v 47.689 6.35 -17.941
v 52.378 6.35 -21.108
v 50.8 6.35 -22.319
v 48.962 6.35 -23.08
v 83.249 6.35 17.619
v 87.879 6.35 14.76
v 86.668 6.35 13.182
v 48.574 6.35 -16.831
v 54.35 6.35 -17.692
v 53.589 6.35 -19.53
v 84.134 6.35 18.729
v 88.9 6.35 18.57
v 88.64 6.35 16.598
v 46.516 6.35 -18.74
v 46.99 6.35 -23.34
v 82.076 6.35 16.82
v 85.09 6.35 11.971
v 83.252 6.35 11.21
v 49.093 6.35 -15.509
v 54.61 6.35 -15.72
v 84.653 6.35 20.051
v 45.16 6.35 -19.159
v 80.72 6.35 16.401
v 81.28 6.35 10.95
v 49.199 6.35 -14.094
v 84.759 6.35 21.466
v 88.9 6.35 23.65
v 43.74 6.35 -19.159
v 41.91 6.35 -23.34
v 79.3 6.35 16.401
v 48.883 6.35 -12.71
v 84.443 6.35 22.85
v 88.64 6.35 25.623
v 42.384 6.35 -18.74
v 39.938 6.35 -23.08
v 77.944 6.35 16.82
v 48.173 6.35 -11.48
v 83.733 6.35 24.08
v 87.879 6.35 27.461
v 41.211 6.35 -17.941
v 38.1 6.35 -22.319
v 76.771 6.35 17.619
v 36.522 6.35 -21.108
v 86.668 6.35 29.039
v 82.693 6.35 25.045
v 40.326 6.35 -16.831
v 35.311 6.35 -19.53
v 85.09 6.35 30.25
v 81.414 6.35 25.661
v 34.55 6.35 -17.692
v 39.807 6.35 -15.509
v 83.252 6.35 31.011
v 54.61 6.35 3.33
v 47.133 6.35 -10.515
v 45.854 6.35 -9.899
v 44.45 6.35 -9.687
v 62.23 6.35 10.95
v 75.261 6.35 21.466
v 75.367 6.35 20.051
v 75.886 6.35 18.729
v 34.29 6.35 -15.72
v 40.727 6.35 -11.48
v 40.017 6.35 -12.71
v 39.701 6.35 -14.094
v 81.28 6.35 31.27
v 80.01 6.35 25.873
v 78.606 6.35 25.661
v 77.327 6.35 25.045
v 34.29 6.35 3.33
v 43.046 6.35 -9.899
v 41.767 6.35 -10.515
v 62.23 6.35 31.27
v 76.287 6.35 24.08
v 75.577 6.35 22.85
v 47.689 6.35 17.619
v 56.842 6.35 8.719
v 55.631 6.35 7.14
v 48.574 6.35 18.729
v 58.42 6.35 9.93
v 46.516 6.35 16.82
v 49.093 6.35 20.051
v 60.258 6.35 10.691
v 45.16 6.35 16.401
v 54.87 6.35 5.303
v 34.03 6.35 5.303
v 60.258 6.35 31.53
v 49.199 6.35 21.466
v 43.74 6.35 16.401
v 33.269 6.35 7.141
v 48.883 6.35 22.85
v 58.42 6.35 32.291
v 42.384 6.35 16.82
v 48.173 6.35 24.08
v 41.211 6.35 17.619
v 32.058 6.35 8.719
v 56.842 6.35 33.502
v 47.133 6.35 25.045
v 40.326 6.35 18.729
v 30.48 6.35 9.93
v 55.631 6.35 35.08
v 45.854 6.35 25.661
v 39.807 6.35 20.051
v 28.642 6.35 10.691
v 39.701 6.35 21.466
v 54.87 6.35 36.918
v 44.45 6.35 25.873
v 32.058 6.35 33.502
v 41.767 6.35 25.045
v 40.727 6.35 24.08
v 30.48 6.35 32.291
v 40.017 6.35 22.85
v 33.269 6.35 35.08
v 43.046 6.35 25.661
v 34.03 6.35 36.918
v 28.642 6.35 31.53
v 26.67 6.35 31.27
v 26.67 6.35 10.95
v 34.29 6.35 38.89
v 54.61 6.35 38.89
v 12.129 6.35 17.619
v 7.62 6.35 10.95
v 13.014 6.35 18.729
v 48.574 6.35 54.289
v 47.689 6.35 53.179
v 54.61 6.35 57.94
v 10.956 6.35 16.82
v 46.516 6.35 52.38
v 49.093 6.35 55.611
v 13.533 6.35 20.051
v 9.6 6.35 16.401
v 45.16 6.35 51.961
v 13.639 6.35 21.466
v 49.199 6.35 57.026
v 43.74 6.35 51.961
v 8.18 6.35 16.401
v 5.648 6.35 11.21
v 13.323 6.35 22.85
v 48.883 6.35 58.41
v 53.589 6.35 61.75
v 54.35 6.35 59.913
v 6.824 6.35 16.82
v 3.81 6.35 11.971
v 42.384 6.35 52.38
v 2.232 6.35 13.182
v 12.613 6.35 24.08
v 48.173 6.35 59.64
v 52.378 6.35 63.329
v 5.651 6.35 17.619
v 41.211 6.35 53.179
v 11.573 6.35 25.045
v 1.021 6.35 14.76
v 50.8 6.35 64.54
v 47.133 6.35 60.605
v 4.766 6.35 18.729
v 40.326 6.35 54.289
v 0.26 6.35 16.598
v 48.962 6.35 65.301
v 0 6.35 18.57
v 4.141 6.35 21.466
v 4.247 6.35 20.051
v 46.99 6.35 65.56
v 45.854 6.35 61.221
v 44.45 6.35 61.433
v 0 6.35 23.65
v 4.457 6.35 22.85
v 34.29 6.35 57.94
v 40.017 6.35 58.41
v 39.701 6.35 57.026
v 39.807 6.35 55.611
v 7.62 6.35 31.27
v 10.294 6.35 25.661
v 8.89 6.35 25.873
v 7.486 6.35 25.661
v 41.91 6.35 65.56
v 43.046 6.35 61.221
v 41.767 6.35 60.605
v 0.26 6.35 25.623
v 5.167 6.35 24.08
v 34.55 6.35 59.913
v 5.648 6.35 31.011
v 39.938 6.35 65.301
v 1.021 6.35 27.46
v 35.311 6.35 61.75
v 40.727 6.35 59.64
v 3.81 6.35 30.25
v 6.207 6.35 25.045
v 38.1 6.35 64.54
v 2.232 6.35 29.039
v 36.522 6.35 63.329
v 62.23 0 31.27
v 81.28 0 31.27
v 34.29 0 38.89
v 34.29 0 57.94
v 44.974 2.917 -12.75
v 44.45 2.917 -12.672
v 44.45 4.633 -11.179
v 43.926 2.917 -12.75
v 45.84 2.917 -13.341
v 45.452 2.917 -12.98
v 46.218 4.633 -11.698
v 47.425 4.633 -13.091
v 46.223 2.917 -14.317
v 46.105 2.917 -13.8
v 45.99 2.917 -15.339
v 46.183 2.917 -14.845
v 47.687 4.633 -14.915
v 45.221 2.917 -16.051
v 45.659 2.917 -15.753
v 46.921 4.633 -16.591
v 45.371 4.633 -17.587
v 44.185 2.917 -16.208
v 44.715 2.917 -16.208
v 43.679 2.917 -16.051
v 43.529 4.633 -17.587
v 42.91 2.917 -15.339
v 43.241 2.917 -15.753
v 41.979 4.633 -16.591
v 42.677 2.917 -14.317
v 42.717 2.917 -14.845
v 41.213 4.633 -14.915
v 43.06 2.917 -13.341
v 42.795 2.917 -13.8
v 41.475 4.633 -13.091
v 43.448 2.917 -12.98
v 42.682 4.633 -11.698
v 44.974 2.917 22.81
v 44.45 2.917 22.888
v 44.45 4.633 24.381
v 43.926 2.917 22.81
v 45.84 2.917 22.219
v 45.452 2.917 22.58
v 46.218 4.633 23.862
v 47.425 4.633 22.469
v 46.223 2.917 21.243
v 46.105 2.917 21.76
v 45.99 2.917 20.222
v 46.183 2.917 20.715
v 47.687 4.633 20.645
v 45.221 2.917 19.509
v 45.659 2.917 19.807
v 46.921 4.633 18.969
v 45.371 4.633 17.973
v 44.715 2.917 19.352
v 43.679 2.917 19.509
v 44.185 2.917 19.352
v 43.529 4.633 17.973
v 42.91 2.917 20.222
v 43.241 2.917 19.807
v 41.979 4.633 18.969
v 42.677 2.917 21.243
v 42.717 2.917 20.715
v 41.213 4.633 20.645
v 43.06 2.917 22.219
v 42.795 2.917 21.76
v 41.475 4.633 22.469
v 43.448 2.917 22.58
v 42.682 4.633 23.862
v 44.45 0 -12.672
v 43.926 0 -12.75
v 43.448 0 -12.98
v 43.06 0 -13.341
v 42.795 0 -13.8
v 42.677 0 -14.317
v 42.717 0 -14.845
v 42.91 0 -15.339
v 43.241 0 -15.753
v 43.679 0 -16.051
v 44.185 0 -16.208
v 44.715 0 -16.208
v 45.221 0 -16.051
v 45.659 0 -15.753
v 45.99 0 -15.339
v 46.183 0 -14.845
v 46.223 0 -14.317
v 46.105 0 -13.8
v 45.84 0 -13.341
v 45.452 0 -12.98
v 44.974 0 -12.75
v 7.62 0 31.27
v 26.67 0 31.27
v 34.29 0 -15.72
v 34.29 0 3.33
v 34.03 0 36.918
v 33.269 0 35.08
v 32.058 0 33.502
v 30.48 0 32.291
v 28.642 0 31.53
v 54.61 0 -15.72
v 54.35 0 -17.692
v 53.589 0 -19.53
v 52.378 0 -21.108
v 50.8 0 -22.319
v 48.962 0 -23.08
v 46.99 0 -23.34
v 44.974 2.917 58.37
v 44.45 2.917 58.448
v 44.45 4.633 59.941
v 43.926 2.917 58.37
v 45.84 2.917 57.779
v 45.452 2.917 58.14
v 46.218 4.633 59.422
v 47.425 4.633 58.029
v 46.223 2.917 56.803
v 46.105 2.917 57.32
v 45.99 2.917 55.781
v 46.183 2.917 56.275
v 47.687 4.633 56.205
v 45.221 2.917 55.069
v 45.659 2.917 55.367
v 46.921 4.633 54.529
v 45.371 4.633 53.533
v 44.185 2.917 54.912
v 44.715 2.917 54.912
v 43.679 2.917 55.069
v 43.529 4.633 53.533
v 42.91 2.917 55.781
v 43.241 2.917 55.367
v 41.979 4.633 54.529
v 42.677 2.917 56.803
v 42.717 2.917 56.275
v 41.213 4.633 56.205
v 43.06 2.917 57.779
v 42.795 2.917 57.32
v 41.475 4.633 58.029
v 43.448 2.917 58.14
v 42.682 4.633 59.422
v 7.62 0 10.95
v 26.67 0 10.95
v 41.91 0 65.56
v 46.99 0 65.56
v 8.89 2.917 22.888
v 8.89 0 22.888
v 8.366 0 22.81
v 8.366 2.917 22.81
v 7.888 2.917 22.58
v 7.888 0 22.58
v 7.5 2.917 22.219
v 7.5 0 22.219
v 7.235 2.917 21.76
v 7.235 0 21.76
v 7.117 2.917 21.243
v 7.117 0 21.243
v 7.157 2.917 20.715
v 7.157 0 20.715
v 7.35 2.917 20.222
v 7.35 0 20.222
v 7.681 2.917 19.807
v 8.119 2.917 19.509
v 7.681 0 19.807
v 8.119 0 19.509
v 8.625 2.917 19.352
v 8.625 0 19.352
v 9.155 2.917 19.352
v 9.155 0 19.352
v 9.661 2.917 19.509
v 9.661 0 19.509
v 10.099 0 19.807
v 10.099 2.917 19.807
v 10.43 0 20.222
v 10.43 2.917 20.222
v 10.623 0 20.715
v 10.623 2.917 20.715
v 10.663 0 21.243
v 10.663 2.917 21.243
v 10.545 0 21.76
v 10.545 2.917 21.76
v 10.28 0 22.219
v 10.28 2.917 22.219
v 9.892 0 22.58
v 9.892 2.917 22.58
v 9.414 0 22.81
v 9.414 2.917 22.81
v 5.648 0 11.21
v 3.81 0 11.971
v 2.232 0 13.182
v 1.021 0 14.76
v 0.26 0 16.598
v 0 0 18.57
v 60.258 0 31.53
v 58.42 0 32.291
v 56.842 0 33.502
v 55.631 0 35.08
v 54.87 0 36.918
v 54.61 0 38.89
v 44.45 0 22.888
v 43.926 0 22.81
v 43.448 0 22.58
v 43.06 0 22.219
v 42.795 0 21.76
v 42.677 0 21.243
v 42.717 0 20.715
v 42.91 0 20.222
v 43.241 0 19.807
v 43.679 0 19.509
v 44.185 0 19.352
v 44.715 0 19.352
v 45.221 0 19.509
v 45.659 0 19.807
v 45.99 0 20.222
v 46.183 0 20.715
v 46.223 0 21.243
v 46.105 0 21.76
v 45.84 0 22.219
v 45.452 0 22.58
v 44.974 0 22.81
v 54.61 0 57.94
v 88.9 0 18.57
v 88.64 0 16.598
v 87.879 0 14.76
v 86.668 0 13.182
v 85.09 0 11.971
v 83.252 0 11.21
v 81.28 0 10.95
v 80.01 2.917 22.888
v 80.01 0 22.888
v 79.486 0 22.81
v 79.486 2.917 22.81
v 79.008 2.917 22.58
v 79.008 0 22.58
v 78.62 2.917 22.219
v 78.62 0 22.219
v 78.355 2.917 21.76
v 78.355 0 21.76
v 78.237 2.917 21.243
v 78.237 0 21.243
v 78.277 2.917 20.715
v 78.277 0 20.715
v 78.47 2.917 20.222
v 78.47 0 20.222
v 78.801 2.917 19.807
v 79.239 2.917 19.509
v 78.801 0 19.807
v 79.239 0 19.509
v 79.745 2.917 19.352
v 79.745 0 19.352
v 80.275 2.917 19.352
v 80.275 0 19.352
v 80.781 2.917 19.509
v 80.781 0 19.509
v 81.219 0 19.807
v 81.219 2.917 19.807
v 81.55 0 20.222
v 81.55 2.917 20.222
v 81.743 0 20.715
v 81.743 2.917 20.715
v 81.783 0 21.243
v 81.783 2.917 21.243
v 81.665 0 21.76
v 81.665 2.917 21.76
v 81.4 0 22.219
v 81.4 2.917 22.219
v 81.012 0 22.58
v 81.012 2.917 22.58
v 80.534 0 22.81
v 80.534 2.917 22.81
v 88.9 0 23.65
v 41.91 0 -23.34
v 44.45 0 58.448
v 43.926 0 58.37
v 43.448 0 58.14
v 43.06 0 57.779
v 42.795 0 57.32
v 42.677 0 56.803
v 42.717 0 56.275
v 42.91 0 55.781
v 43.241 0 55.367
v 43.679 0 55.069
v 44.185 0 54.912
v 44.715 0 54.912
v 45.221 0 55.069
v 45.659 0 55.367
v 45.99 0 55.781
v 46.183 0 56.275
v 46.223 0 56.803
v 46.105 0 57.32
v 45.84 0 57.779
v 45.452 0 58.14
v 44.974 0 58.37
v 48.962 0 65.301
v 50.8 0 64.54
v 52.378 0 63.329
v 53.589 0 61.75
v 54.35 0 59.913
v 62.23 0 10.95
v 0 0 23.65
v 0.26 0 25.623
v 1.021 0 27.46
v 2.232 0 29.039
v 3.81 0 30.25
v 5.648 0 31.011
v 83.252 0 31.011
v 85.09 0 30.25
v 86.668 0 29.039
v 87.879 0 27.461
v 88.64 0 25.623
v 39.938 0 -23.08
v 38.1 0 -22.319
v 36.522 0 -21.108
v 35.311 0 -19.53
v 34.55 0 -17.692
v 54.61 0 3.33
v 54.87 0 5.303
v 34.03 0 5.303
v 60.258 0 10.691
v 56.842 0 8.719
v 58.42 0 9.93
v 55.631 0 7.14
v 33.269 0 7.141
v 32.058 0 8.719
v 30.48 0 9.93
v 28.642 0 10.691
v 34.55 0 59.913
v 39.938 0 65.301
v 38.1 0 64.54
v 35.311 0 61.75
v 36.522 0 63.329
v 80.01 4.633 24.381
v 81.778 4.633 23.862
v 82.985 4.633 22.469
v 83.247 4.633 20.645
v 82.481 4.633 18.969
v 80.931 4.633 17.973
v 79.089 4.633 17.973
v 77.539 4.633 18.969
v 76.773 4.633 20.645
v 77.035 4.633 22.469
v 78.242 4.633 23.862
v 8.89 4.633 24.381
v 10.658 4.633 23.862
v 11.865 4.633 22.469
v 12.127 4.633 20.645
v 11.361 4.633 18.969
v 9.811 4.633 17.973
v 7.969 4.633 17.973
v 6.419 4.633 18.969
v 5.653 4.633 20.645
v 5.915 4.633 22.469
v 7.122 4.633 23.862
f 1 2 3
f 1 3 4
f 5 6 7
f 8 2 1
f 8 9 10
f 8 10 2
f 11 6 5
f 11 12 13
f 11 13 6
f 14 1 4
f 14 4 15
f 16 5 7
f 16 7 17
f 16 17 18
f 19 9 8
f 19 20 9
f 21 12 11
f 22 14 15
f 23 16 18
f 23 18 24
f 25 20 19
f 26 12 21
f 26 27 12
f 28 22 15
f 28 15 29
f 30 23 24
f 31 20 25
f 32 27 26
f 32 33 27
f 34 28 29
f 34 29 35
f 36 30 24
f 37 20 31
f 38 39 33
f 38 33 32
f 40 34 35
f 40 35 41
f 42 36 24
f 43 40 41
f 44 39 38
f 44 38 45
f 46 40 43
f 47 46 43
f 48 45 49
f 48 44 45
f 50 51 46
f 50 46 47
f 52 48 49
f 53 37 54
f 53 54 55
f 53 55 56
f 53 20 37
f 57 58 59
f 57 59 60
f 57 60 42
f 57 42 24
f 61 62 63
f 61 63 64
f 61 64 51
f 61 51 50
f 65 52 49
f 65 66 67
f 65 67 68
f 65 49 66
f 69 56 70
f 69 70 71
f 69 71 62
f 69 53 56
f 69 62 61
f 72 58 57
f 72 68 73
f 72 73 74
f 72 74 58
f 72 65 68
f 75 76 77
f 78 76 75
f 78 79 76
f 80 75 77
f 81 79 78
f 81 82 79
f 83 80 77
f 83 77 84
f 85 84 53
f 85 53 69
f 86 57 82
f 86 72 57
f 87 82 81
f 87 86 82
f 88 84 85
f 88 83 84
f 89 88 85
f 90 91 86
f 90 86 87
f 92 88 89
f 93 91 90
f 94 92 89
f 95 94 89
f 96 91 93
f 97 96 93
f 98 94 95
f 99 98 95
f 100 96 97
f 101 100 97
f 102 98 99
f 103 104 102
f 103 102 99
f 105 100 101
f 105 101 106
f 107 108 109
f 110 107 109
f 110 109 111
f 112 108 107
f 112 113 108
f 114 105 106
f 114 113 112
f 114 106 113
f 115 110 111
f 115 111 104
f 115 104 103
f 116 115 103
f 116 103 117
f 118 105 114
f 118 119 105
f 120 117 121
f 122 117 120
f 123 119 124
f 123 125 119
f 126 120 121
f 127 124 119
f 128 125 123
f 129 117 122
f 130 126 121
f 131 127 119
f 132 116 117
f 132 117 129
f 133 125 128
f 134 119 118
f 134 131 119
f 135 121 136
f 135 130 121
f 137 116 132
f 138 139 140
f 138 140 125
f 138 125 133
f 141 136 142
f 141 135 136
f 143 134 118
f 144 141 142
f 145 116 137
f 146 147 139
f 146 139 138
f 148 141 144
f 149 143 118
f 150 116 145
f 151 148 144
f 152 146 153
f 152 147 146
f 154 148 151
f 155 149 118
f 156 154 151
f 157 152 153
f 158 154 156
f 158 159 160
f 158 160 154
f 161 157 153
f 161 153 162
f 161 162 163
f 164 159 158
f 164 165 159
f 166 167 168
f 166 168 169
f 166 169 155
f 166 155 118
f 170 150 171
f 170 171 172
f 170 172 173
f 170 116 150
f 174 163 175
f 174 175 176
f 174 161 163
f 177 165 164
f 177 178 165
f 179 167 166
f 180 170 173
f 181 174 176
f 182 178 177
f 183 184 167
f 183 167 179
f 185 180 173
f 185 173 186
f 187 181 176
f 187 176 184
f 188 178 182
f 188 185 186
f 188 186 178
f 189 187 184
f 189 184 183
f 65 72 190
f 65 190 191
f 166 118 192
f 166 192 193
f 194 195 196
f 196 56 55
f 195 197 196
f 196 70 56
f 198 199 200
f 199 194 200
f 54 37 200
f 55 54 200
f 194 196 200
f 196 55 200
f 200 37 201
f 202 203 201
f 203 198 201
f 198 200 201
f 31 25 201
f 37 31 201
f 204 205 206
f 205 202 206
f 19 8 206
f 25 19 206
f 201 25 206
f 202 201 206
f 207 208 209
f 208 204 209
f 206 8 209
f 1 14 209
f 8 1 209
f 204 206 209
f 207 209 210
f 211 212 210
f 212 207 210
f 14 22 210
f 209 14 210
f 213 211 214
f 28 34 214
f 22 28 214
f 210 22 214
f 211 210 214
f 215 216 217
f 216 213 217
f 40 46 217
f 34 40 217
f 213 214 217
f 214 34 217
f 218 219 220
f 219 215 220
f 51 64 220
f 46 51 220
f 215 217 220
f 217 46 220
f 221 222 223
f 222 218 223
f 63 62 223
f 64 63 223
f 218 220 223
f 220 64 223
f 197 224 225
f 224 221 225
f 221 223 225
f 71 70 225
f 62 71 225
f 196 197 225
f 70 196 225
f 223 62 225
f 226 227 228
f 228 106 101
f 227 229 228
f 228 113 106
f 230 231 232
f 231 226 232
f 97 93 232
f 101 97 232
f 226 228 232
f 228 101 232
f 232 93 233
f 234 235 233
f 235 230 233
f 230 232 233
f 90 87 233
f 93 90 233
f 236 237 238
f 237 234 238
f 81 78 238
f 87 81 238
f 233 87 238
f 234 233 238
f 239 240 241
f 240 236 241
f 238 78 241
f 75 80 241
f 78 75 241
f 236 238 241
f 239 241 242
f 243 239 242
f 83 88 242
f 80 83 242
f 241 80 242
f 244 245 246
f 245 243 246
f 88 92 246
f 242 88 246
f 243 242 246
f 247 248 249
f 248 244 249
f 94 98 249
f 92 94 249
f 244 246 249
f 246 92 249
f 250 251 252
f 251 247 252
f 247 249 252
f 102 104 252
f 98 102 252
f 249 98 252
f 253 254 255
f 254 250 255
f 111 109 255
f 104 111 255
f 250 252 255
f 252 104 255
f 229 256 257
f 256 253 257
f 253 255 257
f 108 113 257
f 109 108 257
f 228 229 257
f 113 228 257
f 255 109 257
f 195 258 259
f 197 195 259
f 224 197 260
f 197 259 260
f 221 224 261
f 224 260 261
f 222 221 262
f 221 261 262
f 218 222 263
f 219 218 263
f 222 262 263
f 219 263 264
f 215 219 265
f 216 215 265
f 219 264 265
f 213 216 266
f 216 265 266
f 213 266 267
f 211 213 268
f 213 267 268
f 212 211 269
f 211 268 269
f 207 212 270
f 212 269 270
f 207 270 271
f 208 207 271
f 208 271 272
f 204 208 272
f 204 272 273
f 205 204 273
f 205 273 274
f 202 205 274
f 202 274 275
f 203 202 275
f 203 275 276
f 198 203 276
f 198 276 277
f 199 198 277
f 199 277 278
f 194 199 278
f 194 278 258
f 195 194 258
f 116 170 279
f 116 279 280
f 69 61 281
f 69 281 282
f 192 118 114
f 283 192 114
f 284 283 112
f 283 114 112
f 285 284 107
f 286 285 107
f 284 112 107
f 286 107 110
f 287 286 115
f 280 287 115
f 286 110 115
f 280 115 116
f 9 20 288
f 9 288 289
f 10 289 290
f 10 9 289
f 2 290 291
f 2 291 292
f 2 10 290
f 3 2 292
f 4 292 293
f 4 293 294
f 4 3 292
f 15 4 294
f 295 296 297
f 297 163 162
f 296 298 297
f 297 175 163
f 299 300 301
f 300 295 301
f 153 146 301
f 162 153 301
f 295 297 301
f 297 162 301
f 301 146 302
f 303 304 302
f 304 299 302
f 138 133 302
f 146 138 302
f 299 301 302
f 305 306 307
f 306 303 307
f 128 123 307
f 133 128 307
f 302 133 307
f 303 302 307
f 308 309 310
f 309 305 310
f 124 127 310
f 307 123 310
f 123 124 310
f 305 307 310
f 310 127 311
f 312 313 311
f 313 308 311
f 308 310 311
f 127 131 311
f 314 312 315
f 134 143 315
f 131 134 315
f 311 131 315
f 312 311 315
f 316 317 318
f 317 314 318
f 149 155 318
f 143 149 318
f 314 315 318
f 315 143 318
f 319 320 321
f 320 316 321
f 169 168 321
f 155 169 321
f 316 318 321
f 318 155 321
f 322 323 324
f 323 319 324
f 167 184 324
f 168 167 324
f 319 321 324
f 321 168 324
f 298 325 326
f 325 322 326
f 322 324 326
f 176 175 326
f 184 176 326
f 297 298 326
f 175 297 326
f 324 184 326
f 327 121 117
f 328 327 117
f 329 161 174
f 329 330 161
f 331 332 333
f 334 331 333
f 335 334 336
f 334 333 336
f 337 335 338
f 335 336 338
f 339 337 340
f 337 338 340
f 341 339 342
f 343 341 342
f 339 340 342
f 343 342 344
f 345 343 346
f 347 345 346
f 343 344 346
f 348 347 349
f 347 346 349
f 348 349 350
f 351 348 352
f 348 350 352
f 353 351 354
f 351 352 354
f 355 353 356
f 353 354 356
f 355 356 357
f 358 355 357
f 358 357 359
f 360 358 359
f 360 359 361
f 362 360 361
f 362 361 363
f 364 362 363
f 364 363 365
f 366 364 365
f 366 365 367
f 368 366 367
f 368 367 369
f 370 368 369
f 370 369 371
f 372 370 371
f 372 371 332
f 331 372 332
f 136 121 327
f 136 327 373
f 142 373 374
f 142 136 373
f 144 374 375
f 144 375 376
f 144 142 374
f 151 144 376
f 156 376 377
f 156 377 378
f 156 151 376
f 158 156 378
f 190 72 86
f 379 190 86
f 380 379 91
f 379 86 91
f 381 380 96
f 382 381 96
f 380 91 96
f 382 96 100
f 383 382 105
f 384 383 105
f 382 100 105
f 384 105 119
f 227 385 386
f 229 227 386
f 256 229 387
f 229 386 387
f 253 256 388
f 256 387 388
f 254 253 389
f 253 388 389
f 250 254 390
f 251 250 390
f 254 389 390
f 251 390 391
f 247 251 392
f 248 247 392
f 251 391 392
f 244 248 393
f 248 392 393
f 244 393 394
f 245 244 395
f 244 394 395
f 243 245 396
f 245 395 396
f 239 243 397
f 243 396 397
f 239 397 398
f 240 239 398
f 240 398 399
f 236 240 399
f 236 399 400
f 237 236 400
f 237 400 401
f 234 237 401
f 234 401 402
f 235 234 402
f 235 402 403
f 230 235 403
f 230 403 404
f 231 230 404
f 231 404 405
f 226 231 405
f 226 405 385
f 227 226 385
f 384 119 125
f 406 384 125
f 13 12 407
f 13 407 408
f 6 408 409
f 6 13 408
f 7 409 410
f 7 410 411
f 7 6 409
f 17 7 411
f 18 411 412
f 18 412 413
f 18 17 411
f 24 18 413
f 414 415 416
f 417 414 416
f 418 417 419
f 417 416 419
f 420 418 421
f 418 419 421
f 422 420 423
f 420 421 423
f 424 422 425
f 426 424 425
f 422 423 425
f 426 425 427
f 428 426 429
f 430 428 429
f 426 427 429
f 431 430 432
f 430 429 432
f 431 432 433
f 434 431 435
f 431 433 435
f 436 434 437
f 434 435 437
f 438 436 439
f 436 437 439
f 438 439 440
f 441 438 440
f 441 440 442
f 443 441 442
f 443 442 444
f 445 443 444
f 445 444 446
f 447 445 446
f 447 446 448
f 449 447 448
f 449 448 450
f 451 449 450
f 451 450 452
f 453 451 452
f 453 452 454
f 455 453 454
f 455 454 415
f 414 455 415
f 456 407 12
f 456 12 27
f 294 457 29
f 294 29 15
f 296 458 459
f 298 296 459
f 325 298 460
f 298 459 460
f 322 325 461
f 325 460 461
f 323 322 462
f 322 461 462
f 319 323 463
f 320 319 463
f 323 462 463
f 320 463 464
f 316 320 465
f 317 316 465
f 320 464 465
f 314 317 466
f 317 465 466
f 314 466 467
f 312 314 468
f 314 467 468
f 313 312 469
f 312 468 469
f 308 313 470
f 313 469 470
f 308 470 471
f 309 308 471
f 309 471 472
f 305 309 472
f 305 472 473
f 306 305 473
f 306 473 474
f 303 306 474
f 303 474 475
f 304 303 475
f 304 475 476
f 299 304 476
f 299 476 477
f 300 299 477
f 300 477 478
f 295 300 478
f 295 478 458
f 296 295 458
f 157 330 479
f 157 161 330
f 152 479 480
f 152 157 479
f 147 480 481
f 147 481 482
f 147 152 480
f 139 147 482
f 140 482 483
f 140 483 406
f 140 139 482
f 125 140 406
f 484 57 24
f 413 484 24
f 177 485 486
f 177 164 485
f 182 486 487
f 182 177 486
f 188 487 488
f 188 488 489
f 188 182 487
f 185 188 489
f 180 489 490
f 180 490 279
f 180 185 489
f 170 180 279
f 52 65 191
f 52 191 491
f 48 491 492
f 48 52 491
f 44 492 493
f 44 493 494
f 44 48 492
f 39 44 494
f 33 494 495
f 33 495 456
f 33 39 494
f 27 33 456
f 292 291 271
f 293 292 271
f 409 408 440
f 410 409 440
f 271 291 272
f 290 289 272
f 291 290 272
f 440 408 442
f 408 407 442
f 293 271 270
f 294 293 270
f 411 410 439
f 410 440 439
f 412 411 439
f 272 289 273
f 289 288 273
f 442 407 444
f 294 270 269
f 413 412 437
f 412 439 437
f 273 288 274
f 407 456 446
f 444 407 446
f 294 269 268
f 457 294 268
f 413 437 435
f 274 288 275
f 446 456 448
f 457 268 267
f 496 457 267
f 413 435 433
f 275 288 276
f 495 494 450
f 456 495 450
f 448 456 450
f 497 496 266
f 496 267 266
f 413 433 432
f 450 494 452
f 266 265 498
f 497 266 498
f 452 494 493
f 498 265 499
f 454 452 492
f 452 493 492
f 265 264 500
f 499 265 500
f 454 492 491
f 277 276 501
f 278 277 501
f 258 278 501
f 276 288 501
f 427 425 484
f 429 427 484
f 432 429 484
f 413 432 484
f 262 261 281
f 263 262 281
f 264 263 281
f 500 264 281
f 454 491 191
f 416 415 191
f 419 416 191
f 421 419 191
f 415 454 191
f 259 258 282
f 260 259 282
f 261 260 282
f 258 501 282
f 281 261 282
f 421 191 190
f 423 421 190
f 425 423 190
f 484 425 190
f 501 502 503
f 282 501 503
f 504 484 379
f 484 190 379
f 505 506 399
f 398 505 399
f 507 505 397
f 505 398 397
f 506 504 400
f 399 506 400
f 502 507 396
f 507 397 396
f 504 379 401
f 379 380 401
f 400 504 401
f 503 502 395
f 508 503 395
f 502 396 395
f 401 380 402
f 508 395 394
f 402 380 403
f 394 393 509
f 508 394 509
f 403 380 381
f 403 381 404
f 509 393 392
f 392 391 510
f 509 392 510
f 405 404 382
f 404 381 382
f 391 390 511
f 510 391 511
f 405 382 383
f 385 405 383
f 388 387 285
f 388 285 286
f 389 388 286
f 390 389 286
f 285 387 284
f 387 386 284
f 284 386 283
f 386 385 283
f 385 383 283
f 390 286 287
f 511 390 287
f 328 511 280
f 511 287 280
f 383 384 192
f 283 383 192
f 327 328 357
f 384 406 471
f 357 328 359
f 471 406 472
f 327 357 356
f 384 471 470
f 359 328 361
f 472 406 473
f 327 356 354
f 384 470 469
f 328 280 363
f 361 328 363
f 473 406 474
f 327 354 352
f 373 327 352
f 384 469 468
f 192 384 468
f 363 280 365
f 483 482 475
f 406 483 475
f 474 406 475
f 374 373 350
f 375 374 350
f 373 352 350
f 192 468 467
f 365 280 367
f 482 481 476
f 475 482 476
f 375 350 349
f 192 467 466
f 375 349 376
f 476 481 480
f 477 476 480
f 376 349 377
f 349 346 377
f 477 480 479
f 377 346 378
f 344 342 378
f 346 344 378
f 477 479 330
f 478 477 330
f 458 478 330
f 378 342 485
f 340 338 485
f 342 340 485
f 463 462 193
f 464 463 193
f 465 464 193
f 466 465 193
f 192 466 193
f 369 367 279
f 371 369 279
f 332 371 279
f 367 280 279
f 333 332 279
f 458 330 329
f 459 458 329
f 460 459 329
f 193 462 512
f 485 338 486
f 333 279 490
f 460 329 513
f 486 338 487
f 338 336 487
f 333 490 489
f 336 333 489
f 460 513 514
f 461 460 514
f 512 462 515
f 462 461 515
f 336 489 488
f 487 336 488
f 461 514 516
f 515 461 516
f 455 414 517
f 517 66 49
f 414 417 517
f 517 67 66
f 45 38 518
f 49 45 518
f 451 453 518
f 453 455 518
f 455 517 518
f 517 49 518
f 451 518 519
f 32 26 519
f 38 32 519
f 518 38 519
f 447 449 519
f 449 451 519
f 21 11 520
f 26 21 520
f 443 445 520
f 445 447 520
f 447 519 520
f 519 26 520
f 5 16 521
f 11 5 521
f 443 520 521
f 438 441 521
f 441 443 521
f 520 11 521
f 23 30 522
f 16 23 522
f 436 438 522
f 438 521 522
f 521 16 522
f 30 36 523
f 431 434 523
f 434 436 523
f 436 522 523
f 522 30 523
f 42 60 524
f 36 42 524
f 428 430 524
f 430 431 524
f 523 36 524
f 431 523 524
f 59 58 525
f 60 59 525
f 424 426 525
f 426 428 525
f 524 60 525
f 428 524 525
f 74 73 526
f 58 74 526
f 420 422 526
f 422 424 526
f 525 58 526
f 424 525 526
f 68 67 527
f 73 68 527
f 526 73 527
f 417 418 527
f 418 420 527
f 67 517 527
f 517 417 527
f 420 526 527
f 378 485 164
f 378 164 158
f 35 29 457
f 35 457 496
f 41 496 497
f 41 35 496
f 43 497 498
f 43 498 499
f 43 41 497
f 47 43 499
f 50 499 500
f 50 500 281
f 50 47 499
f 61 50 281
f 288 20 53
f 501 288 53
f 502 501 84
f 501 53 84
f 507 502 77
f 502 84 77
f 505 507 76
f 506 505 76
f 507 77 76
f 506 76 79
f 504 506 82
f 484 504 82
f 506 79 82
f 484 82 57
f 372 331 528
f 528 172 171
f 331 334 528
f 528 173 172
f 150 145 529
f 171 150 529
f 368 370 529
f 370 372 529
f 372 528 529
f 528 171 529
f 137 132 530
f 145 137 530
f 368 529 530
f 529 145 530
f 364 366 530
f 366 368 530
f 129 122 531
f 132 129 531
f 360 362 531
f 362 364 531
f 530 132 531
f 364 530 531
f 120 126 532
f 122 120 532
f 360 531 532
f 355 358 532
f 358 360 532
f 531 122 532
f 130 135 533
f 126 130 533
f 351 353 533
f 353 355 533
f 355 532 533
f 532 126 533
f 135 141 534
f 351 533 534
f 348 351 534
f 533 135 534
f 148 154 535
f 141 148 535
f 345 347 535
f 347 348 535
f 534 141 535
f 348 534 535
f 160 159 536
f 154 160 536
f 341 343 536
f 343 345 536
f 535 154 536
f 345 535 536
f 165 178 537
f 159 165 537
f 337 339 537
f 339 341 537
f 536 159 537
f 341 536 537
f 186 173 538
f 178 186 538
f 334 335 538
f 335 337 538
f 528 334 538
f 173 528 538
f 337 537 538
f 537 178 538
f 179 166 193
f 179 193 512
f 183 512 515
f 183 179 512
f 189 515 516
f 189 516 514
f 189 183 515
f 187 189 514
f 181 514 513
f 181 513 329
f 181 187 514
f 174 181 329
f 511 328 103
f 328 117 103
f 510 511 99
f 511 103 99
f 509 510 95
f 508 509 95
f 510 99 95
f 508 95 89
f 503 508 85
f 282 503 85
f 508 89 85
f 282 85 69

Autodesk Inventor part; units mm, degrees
ref_plane "YZ Plane" through (0, 0, 0) normal (1, 0, 0) x (0, 1, 0)
ref_plane "XZ Plane" through (0, 0, 0) normal (0, 1, 0) x (-1, 0, 0)
ref_plane "XY Plane" through (0, 0, 0) normal (0, 0, 1) x (1, 0, 0)
sketch "Sketch1" plane through (0, 0, 0) normal (0, 1, 0) x (-1, 0, 0)
  line L0 (0, -23.3395) -> (-88.9, -23.3395)
  line L1 (-88.9, -23.3395) -> (-88.9, 65.5605)
  line L2 (-88.9, 65.5605) -> (0, 65.5605)
  line L3 (0, 65.5605) -> (0, -23.3395)
  point P0 (0, 0)
  dimension "d0" = 88.9
  dimension "d1" = 88.9
extrude "Extrusion1" add sketch "Sketch1" along normal blind 6.35
sketch "Sketch2" plane through (0, 6.35, 0) normal (0, 1, 0) x (1, 0, 0)
  line L0 (88.9, -65.5605) -> (88.9, 23.3395) projected
  line L1 (88.9, 23.3395) -> (0, 23.3395) projected
  point P0 (0, 0)
  point P1 (44.45, -21.1105)
  point P2 (80.01, -21.1105)
  point P3 (8.89, -21.1105)
  point P4 (44.45, 14.4495)
  point P5 (44.45, -56.6705)
  dimension "d4" = 44.45
  dimension "d5" = 44.45
  dimension "d6" = 35.56
  dimension "d7" = 35.56
  dimension "d8" = 35.56
  dimension "d9" = 35.56
hole "Hole1" at (44.45, 6.35, 21.1105) at (80.01, 6.35, 21.1105) at (8.89, 6.35, 21.1105) at (44.45, 6.35, -14.4495) at (44.45, 6.35, 56.6705) direction (0, -1, 0) diameter 3.556 end through all countersink diameter 9.525 countersink angle 82
sketch "Sketch3" plane through (0, 6.35, 0) normal (0, 1, 0) x (1, 0, 0)
  line L0 (88.9, 23.3395) -> (0, 23.3395) projected
  line L1 (88.9, -65.5605) -> (0, -65.5605) projected
  line L2 (0, -65.5605) -> (0, 23.3395) projected
  line L3 (88.9, 23.3395) -> (88.9, -65.5605) projected
  line L4 (34.29, 15.7195) -> (34.29, -3.3305)
  line L5 (34.29, -38.8905) -> (34.29, -57.9405)
  line L6 (54.61, 15.7195) -> (54.61, -3.3305)
  line L7 (54.61, -38.8905) -> (54.61, -57.9405)
  line L8 (7.62, -31.2705) -> (26.67, -31.2705)
  line L9 (62.23, -31.2705) -> (81.28, -31.2705)
  line L10 (7.62, -10.9505) -> (26.67, -10.9505)
  line L11 (62.23, -10.9505) -> (81.28, -10.9505)
  line L12 (0, -18.5705) -> (0, -23.6505)
  line L13 (41.91, -65.5605) -> (46.99, -65.5605)
  line L14 (88.9, -23.6505) -> (88.9, -18.5705)
  line L15 (41.91, 23.3395) -> (46.99, 23.3395)
  arc A0 (41.91, 23.3395) -> (34.29, 15.7195) centre (41.91, 15.7195) ccw
  arc A1 (54.61, 15.7195) -> (46.99, 23.3395) centre (46.99, 15.7195) ccw
  arc A2 (26.67, -10.9505) -> (34.29, -3.3305) centre (26.67, -3.3305) ccw
  arc A3 (7.62, -10.9505) -> (0, -18.5705) centre (7.62, -18.5705) ccw
  arc A4 (0, -23.6505) -> (7.62, -31.2705) centre (7.62, -23.6505) ccw
  arc A5 (34.29, -38.8905) -> (26.67, -31.2705) centre (26.67, -38.8905) ccw
  arc A6 (34.29, -57.9405) -> (41.91, -65.5605) centre (41.91, -57.9405) ccw
  arc A7 (46.99, -65.5605) -> (54.61, -57.9405) centre (46.99, -57.9405) ccw
  arc A8 (62.23, -31.2705) -> (54.61, -38.8905) centre (62.23, -38.8905) ccw
  arc A9 (81.28, -31.2705) -> (88.9, -23.6505) centre (81.28, -23.6505) ccw
  arc A10 (88.9, -18.5705) -> (81.28, -10.9505) centre (81.28, -18.5705) ccw
  arc A11 (54.61, -3.3305) -> (62.23, -10.9505) centre (62.23, -3.3305) ccw
  point P0 (0, 0)
  dimension "d21" = 7.62
extrude "Extrusion2" cut sketch "Sketch3" against normal blind 6.35 contours L3 A10 L11 A11 L6 A1 L0 | A0 L4 A2 L10 A3 L2 L0 | L3 L1 A7 L7 A8 L9 A9 | A4 L8 A5 L5 A6 L1 L2
equation "\"d4\" = 0.5 * d1"
equation "\"d5\" = 0.5 * d1"
properties part number "plus sign" material "Polypropylene"
